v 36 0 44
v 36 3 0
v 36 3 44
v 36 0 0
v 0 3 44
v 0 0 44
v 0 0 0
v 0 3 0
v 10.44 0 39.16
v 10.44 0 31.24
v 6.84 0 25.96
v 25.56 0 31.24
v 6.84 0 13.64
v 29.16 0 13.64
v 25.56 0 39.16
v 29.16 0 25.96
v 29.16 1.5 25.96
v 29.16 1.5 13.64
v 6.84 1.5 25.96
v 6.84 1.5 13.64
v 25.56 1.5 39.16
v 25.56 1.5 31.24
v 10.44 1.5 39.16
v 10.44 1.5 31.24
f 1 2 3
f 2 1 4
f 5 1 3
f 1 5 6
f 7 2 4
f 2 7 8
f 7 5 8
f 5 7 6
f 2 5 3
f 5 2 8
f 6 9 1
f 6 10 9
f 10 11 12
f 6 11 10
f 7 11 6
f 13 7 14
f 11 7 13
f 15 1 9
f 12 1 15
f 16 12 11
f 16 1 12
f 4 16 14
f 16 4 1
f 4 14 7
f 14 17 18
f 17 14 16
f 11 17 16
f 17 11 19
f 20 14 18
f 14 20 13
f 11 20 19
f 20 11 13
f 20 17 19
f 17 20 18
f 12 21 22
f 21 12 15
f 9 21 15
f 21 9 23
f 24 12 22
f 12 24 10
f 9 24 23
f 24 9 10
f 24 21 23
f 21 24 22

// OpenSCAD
// DIN-rail retaining clip.
$fn = 60;
eps = 0.02;
clip_w = 36;
clip_h = 44;
clip_t = 3;
difference() { cube([clip_w,clip_t,clip_h]); translate([clip_w/2, -eps, clip_h*0.45]) cube([clip_w*0.62,clip_t+2*eps,clip_h*0.28],center=true); translate([clip_w/2, -eps, clip_h*0.8]) cube([clip_w*0.42,clip_t+2*eps,clip_h*0.18],center=true); }
